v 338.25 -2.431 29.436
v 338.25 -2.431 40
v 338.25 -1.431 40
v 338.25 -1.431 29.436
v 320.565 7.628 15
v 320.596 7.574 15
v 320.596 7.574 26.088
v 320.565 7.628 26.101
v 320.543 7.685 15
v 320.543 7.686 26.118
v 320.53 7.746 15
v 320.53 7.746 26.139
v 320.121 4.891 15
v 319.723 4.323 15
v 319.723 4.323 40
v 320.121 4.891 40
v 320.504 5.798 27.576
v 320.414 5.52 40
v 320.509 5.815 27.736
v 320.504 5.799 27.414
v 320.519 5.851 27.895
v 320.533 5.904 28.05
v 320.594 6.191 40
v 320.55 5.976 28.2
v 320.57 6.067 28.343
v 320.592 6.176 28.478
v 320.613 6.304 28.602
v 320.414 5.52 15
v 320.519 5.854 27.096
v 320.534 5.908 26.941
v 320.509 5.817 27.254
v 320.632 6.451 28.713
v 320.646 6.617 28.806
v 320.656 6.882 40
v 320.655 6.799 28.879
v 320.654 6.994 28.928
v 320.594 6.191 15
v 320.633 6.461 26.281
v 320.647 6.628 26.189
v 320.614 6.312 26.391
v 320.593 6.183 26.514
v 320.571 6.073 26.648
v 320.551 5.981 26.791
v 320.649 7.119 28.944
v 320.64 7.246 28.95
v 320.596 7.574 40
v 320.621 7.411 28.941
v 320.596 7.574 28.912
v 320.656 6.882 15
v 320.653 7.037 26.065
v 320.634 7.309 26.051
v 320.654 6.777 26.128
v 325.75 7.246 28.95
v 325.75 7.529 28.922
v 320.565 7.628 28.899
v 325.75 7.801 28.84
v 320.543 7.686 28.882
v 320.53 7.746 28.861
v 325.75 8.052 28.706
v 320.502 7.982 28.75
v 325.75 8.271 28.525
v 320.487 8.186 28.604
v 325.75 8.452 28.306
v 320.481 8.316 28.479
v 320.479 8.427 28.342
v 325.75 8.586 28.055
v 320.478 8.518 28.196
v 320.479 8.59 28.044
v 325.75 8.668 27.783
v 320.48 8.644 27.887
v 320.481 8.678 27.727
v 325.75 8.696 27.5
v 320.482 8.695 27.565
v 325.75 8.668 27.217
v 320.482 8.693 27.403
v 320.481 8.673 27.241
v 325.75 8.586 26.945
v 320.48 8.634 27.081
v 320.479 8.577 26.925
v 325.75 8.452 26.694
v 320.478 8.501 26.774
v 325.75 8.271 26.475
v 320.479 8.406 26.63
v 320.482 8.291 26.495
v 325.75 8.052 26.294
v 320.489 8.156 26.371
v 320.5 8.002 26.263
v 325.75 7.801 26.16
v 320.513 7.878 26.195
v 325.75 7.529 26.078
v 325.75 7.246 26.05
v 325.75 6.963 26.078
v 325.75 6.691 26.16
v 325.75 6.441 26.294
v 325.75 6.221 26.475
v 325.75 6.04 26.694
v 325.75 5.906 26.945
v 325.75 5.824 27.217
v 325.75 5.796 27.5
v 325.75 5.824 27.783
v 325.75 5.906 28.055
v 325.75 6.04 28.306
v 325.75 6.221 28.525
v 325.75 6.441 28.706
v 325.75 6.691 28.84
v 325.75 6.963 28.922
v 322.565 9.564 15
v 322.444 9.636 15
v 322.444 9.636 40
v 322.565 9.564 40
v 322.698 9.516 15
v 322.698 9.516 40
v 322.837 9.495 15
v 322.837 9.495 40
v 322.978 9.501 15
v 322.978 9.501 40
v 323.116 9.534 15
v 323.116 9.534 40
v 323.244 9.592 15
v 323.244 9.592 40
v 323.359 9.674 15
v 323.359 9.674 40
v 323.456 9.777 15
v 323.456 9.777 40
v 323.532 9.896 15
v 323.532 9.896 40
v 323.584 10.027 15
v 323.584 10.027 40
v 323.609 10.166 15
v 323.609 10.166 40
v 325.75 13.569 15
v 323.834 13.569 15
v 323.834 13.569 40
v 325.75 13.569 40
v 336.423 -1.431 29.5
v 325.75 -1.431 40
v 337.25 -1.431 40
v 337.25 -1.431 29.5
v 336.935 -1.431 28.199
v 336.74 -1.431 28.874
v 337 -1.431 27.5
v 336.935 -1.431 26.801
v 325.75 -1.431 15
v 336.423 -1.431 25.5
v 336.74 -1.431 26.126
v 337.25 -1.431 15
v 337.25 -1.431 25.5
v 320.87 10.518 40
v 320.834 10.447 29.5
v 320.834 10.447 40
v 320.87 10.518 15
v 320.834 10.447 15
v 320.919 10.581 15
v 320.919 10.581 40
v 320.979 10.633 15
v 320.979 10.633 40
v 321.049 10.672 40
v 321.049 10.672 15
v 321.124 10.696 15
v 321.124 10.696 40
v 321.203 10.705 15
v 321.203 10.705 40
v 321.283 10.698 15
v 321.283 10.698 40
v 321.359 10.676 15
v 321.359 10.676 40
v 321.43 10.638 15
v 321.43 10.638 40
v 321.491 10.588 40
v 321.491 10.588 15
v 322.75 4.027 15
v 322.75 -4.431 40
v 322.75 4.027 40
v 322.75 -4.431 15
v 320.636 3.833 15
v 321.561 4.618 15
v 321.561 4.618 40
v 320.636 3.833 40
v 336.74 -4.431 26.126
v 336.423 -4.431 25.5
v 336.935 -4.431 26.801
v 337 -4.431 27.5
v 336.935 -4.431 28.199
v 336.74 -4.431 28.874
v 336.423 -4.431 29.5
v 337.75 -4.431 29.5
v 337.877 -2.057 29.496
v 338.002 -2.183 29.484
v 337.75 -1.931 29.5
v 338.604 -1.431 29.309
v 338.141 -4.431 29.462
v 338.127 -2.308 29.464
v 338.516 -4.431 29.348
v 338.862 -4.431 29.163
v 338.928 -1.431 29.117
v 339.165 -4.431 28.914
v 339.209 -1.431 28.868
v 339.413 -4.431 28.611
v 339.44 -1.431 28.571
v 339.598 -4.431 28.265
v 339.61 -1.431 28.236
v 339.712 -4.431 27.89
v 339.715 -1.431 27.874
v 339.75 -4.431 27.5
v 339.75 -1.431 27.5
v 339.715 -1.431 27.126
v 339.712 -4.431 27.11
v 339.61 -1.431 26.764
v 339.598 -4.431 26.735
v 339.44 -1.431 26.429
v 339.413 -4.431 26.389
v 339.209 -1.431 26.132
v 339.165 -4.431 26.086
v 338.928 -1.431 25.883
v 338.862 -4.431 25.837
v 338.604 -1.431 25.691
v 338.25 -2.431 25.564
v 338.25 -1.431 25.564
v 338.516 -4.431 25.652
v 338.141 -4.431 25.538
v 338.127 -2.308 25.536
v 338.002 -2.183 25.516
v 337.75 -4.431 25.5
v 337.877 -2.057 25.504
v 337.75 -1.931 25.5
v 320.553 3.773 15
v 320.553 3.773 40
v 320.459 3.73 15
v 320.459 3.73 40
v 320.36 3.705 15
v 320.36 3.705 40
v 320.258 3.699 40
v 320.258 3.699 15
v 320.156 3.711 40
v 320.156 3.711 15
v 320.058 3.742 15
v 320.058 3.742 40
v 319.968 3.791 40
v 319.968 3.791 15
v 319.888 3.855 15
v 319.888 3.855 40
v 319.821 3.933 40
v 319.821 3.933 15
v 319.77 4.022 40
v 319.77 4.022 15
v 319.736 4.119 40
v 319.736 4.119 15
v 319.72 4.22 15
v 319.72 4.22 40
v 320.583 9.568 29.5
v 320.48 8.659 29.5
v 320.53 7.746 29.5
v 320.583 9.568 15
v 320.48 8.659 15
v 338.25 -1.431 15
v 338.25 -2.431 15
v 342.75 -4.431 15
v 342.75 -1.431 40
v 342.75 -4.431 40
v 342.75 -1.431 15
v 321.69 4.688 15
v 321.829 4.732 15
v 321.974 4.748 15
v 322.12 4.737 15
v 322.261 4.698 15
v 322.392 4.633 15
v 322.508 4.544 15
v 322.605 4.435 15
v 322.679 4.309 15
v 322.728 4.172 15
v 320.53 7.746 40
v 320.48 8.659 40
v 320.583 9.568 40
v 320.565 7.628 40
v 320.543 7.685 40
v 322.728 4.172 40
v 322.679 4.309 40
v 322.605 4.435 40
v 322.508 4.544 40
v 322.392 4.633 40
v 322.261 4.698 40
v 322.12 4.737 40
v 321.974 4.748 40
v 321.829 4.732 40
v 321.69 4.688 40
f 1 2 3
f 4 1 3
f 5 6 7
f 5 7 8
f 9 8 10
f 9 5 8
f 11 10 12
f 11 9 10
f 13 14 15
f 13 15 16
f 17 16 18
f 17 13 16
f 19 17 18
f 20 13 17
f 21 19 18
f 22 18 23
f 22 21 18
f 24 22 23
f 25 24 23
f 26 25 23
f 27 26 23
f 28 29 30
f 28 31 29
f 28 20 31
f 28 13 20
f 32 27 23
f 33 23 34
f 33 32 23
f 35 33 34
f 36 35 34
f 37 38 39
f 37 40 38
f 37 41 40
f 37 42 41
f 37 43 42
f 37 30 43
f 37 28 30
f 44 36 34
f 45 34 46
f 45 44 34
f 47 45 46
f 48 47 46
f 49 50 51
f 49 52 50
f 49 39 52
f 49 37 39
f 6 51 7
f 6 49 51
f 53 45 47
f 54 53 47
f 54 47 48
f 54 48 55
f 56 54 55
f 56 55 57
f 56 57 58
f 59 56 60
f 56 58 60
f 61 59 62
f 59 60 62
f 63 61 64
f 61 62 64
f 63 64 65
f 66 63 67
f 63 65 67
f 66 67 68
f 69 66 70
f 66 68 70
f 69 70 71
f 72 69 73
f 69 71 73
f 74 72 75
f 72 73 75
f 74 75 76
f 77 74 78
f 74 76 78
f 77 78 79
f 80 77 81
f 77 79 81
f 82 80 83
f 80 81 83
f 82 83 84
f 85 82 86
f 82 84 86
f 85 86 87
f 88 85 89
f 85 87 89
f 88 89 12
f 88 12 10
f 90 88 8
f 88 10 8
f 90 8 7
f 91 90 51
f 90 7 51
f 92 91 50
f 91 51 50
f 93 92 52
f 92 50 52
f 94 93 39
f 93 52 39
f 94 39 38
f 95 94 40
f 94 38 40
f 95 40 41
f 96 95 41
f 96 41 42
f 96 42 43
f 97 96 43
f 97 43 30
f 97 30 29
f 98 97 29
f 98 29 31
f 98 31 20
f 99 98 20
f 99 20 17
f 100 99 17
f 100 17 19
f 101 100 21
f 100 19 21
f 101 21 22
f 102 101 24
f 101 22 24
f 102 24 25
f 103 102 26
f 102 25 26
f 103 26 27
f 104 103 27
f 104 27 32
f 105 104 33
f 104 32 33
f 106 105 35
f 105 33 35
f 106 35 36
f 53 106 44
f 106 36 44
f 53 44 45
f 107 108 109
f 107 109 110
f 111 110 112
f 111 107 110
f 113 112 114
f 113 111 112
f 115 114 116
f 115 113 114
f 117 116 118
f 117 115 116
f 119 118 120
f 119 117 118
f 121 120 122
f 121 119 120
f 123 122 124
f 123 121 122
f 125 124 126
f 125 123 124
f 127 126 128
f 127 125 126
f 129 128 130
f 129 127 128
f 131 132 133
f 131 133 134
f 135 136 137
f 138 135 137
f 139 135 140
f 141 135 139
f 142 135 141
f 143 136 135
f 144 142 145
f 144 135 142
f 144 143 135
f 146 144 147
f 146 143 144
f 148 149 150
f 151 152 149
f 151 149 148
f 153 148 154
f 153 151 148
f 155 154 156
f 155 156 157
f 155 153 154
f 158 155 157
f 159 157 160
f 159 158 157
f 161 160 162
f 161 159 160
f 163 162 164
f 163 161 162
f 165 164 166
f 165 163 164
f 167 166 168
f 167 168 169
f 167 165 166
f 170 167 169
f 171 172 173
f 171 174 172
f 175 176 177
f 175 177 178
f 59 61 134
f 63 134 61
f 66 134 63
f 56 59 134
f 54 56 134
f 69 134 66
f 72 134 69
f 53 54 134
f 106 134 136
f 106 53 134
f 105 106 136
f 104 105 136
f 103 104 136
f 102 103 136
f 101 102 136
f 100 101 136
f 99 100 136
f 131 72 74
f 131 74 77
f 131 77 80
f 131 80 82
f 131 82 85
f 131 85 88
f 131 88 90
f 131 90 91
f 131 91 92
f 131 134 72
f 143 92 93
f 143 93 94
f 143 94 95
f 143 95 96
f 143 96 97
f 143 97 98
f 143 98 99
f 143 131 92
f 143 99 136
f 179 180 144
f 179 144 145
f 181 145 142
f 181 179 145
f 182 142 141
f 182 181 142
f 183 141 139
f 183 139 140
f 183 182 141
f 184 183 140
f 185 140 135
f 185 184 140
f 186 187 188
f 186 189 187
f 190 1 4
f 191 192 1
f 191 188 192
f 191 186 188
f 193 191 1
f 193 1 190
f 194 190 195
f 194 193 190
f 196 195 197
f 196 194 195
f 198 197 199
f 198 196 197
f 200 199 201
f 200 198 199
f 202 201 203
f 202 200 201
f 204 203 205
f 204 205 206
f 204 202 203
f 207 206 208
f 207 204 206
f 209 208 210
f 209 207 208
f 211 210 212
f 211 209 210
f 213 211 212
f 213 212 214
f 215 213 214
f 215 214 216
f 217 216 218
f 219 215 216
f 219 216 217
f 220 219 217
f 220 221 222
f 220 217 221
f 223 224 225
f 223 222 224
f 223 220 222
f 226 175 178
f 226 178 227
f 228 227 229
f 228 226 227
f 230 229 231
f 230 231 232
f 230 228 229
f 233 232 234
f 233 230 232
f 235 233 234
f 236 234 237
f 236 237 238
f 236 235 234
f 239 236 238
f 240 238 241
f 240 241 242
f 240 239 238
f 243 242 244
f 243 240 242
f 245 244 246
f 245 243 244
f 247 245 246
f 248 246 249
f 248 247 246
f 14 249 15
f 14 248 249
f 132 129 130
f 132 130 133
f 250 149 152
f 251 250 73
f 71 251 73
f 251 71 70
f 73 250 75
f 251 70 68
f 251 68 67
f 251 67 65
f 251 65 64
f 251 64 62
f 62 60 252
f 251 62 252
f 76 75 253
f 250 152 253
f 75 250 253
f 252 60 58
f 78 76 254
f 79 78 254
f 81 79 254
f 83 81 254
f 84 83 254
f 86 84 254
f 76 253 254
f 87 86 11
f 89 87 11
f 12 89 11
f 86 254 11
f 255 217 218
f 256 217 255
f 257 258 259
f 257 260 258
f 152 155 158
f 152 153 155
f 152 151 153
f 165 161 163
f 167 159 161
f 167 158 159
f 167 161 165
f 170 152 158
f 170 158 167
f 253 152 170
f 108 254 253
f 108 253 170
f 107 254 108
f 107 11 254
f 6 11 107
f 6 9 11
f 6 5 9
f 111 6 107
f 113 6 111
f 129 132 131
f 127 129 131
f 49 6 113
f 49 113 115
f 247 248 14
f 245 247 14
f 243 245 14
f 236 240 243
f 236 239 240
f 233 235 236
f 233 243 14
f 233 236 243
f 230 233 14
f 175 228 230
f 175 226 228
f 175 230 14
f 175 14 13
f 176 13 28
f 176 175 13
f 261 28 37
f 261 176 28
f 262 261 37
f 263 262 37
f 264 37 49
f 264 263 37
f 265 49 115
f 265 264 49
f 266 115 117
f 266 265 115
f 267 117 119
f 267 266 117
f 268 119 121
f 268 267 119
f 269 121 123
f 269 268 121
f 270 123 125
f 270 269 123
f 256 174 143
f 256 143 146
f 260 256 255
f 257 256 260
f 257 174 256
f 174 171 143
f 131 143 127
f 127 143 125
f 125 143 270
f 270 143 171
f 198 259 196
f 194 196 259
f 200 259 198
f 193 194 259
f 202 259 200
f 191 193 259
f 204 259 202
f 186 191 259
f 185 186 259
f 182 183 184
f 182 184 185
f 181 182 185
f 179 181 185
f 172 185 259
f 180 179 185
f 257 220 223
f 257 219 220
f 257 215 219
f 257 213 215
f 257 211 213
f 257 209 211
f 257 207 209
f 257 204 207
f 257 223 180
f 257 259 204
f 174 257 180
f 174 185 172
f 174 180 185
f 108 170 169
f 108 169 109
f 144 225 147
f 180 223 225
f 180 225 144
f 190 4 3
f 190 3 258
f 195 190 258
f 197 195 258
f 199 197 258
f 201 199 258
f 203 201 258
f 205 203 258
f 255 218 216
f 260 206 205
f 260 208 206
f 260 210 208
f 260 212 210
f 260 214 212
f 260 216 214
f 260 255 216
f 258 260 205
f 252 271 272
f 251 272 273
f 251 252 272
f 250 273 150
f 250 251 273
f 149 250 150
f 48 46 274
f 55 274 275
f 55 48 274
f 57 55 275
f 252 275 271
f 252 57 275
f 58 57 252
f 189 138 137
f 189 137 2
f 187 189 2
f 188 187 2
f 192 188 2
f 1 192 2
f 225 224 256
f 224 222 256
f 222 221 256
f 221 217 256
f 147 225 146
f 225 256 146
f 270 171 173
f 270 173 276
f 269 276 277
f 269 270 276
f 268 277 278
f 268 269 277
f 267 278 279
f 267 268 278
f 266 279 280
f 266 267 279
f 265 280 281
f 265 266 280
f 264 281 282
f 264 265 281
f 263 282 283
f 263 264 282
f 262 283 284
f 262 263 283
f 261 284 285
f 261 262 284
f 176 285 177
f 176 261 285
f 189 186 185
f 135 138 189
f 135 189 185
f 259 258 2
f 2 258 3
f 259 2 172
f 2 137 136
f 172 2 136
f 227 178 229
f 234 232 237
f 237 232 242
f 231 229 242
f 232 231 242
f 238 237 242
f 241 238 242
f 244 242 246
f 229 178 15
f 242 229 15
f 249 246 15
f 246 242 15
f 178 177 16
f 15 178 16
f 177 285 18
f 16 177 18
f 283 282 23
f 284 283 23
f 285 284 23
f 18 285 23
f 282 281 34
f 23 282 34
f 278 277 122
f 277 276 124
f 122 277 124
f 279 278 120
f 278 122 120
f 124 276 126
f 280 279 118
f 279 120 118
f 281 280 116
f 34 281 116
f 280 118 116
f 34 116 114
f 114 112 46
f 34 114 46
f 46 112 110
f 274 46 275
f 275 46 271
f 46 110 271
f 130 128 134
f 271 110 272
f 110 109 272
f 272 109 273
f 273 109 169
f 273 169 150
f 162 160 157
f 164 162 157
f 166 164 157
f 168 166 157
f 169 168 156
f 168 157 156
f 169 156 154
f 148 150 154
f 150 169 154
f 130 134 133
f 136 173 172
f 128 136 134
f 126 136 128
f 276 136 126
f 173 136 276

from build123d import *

# Parameters (mm, degrees)
CUT_EXTRUDE1_START        = 15
CUT_EXTRUDE1_DEPTH        = 10.5
CUT_EXTRUDE1_START_2      = 25.5
CUT_EXTRUDE1_2_DEPTH      = 4
CUT_EXTRUDE1_START_3      = -5
CUT_EXTRUDE1_3_DEPTH      = 3.568757805
BOSS_EXTRUDE1_DEPTH       = 0.5
BOSS_EXTRUDE2_DEPTH       = 0.5
SKETCH4_W                 = 14.5
SKETCH4_H                 = 15
CUT_EXTRUDE2_DEPTH        = 10.672144385
BOSS_EXTRUDE3_DEPTH       = 10.5
F_3_CLEARANCE_HOLE1_D     = 2.9
F_3_CLEARANCE_HOLE1_DEPTH = 6.031783808


with BuildPart() as part:
    # Cut-Extrude1: read off the stored shape, not the designer's step
    # Cut-Extrude1 outline → Cut-Extrude1 (new body)
    with BuildSketch(Plane.XY.offset(CUT_EXTRUDE1_START)):
        with BuildLine():
            Line((337.250458866, -1.431242195), (336.422603251, -1.431242195))
            Line((336.422603251, -1.431242195), (336.422603251, 13.568757805))
            Line((336.422603251, 13.568757805), (323.834138276, 13.568757805))
            Line((323.834138276, 13.568757805), (323.608997572, 10.166078708))
            ThreePointArc((323.608997572, 10.166078708), (323.181382472, 9.560091757), (322.443572772, 9.635667582))
            Line((322.443572772, 9.635667582), (321.491292518, 10.587947835))
            ThreePointArc((321.491292518, 10.587947835), (321.1243382, 10.696161689), (320.834327975, 10.446642593))
            ThreePointArc((320.834327975, 10.446642593), (320.5127775, 9.115460329), (320.529645575, 7.746096829))
            ThreePointArc((320.529645575, 7.746096829), (320.552977781, 7.656046386), (320.596479116, 7.57382043))
            ThreePointArc((320.596479116, 7.57382043), (320.51875348, 5.851708999), (319.722869168, 4.322566357))
            ThreePointArc((319.722869168, 4.322566357), (320.011740784, 3.764617073), (320.636356902, 3.832506086))
            Line((320.636356902, 3.832506086), (321.56122175, 4.617919231))
            ThreePointArc((321.56122175, 4.617919231), (322.32777998, 4.668660807), (322.750458866, 4.027155713))
            Line((322.750458866, 4.027155713), (322.750458866, -4.431242195))
            Line((322.750458866, -4.431242195), (342.750458866, -4.431242195))
            Line((342.750458866, -4.431242195), (342.750458866, -2.431242195))
            Line((342.750458866, -2.431242195), (338.250458866, -2.431242195))
            Line((338.250458866, -2.431242195), (337.250458866, -1.431242195))
        make_face()
    extrude(amount=CUT_EXTRUDE1_DEPTH)

    # Cut-Extrude1 2 outline → Cut-Extrude1 2 (add)
    with BuildSketch(Plane.XY.offset(CUT_EXTRUDE1_START_2)):
        with BuildLine():
            Line((337.250458866, -1.431242195), (336.422603251, -1.431242195))
            Line((336.422603251, -1.431242195), (336.422603251, 13.568757805))
            Line((336.422603251, 13.568757805), (323.834138276, 13.568757805))
            Line((323.834138276, 13.568757805), (323.608997572, 10.166078708))
            ThreePointArc((323.608997572, 10.166078708), (323.181382472, 9.560091757), (322.443572772, 9.635667582))
            Line((322.443572772, 9.635667582), (321.491292518, 10.587947835))
            ThreePointArc((321.491292518, 10.587947835), (321.1243382, 10.696161689), (320.834327975, 10.446642593))
            ThreePointArc((320.834327975, 10.446642593), (320.5127775, 9.115460329), (320.529645575, 7.746096829))
            ThreePointArc((320.529645575, 7.746096829), (320.552977781, 7.656046386), (320.596479116, 7.57382043))
            ThreePointArc((320.596479116, 7.57382043), (320.51875348, 5.851708999), (319.722869168, 4.322566357))
            ThreePointArc((319.722869168, 4.322566357), (320.011740784, 3.764617073), (320.636356902, 3.832506086))
            Line((320.636356902, 3.832506086), (321.56122175, 4.617919231))
            ThreePointArc((321.56122175, 4.617919231), (322.32777998, 4.668660807), (322.750458866, 4.027155713))
            Line((322.750458866, 4.027155713), (322.750458866, -4.431242195))
            Line((322.750458866, -4.431242195), (342.750458866, -4.431242195))
            Line((342.750458866, -4.431242195), (342.750458866, -2.431242195))
            Line((342.750458866, -2.431242195), (338.250458866, -2.431242195))
            Line((338.250458866, -2.431242195), (337.250458866, -1.431242195))
        make_face()
    extrude(amount=CUT_EXTRUDE1_2_DEPTH)

    # Cut-Extrude1 3 outline → Cut-Extrude1 3 (cut)
    with BuildSketch(Plane(origin=(0, 0, 0), x_dir=(1, 0, 0), z_dir=(0, 1, 0)).offset(CUT_EXTRUDE1_START_3)):
        with BuildLine():
            ThreePointArc((336.422603251, -25.5), (337.000458866, -27.5), (336.422603251, -29.5))
            Line((336.422603251, -29.5), (337.750458866, -29.5))
            ThreePointArc((337.750458866, -29.5), (339.750458866, -27.5), (337.750458866, -25.5))
            Line((337.750458866, -25.5), (336.422603251, -25.5))
        make_face()
    extrude(amount=CUT_EXTRUDE1_3_DEPTH, mode=Mode.SUBTRACT)

    # Sketch2 → Boss-Extrude1 (add)
    with BuildSketch(Plane(origin=(0, -2.431242195, 0), x_dir=(-1, 0, 0), z_dir=(0, 1, 0))):
        with BuildLine():
            Line((-338.250458866, 29.5), (-338.250458866, 29.436491673))
            ThreePointArc((-338.250458866, 29.436491673), (-339.750458866, 27.5), (-338.250458866, 25.563508327))
            Line((-338.250458866, 25.563508327), (-338.250458866, 15))
            Line((-338.250458866, 15), (-342.750458866, 15))
            Line((-342.750458866, 15), (-342.750458866, 29.5))
            Line((-342.750458866, 29.5), (-338.250458866, 29.5))
        make_face()
    extrude(amount=BOSS_EXTRUDE1_DEPTH)

    # Sketch3 → Boss-Extrude2 (add)
    with BuildSketch(Plane(origin=(0, -1.931242195, 0), x_dir=(-1, 0, 0), z_dir=(0, 1, 0))):
        with BuildLine():
            Line((-338.250458866, 29.5), (-338.250458866, 29.436491673))
            ThreePointArc((-338.250458866, 29.436491673), (-339.750458866, 27.5), (-338.250458866, 25.563508327))
            Line((-338.250458866, 25.563508327), (-338.250458866, 15))
            Line((-338.250458866, 15), (-342.750458866, 15))
            Line((-342.750458866, 15), (-342.750458866, 29.5))
            Line((-342.750458866, 29.5), (-338.250458866, 29.5))
        make_face()
    extrude(amount=BOSS_EXTRUDE2_DEPTH)

    # Sketch4 → Cut-Extrude2 (cut)
    with BuildSketch(Plane(origin=(336.422603251, 0, 0), x_dir=(0, 0, -1), z_dir=(1, 0, 0))):
        with Locations((-22.25, 6.068757805)):
            Rectangle(SKETCH4_W, SKETCH4_H)
    extrude(amount=-CUT_EXTRUDE2_DEPTH, mode=Mode.SUBTRACT)

    # Sketch5 → Boss-Extrude3 (add)
    with BuildSketch(Plane.XY.offset(29.5)):
        with BuildLine():
            Line((322.750458866, -4.431242195), (322.750458866, 4.027155713))
            ThreePointArc((322.750458866, 4.027155713), (322.32777998, 4.668660807), (321.56122175, 4.617919231))
            Line((321.56122175, 4.617919231), (320.636356902, 3.832506086))
            ThreePointArc((320.636356902, 3.832506086), (320.011740784, 3.764617073), (319.722869168, 4.322566357))
            ThreePointArc((319.722869168, 4.322566357), (320.51875348, 5.851708999), (320.596479116, 7.57382043))
            ThreePointArc((320.596479116, 7.57382043), (320.552977781, 7.656046387), (320.529645575, 7.746096829))
            ThreePointArc((320.529645575, 7.746096829), (320.5127775, 9.11546033), (320.834327975, 10.446642593))
            ThreePointArc((320.834327975, 10.446642593), (321.1243382, 10.696161689), (321.491292518, 10.587947835))
            Line((321.491292518, 10.587947835), (322.443572772, 9.635667582))
            ThreePointArc((322.443572772, 9.635667582), (323.181382472, 9.560091757), (323.608997572, 10.166078708))
            Line((323.608997572, 10.166078708), (323.834138276, 13.568757805))
            Line((323.834138276, 13.568757805), (325.750458866, 13.568757805))
            Line((325.750458866, 13.568757805), (325.750458866, -1.431242195))
            Line((325.750458866, -1.431242195), (337.250458866, -1.431242195))
            Line((337.250458866, -1.431242195), (338.250458866, -2.431242195))
            Line((338.250458866, -2.431242195), (338.250458866, -1.431242195))
            Line((338.250458866, -1.431242195), (342.750458866, -1.431242195))
            Line((342.750458866, -1.431242195), (342.750458866, -4.431242195))
            Line((342.750458866, -4.431242195), (322.750458866, -4.431242195))
        make_face()
    extrude(amount=BOSS_EXTRUDE3_DEPTH)

    # #3 Clearance Hole1
    with Locations(Plane(origin=(325.750458866, 0, 0), x_dir=(0, 0, -1), z_dir=(1, 0, 0))):
        with Locations((-27.5, 7.246096829)):
            Hole(F_3_CLEARANCE_HOLE1_D / 2, depth=F_3_CLEARANCE_HOLE1_DEPTH)


solid = part.part
